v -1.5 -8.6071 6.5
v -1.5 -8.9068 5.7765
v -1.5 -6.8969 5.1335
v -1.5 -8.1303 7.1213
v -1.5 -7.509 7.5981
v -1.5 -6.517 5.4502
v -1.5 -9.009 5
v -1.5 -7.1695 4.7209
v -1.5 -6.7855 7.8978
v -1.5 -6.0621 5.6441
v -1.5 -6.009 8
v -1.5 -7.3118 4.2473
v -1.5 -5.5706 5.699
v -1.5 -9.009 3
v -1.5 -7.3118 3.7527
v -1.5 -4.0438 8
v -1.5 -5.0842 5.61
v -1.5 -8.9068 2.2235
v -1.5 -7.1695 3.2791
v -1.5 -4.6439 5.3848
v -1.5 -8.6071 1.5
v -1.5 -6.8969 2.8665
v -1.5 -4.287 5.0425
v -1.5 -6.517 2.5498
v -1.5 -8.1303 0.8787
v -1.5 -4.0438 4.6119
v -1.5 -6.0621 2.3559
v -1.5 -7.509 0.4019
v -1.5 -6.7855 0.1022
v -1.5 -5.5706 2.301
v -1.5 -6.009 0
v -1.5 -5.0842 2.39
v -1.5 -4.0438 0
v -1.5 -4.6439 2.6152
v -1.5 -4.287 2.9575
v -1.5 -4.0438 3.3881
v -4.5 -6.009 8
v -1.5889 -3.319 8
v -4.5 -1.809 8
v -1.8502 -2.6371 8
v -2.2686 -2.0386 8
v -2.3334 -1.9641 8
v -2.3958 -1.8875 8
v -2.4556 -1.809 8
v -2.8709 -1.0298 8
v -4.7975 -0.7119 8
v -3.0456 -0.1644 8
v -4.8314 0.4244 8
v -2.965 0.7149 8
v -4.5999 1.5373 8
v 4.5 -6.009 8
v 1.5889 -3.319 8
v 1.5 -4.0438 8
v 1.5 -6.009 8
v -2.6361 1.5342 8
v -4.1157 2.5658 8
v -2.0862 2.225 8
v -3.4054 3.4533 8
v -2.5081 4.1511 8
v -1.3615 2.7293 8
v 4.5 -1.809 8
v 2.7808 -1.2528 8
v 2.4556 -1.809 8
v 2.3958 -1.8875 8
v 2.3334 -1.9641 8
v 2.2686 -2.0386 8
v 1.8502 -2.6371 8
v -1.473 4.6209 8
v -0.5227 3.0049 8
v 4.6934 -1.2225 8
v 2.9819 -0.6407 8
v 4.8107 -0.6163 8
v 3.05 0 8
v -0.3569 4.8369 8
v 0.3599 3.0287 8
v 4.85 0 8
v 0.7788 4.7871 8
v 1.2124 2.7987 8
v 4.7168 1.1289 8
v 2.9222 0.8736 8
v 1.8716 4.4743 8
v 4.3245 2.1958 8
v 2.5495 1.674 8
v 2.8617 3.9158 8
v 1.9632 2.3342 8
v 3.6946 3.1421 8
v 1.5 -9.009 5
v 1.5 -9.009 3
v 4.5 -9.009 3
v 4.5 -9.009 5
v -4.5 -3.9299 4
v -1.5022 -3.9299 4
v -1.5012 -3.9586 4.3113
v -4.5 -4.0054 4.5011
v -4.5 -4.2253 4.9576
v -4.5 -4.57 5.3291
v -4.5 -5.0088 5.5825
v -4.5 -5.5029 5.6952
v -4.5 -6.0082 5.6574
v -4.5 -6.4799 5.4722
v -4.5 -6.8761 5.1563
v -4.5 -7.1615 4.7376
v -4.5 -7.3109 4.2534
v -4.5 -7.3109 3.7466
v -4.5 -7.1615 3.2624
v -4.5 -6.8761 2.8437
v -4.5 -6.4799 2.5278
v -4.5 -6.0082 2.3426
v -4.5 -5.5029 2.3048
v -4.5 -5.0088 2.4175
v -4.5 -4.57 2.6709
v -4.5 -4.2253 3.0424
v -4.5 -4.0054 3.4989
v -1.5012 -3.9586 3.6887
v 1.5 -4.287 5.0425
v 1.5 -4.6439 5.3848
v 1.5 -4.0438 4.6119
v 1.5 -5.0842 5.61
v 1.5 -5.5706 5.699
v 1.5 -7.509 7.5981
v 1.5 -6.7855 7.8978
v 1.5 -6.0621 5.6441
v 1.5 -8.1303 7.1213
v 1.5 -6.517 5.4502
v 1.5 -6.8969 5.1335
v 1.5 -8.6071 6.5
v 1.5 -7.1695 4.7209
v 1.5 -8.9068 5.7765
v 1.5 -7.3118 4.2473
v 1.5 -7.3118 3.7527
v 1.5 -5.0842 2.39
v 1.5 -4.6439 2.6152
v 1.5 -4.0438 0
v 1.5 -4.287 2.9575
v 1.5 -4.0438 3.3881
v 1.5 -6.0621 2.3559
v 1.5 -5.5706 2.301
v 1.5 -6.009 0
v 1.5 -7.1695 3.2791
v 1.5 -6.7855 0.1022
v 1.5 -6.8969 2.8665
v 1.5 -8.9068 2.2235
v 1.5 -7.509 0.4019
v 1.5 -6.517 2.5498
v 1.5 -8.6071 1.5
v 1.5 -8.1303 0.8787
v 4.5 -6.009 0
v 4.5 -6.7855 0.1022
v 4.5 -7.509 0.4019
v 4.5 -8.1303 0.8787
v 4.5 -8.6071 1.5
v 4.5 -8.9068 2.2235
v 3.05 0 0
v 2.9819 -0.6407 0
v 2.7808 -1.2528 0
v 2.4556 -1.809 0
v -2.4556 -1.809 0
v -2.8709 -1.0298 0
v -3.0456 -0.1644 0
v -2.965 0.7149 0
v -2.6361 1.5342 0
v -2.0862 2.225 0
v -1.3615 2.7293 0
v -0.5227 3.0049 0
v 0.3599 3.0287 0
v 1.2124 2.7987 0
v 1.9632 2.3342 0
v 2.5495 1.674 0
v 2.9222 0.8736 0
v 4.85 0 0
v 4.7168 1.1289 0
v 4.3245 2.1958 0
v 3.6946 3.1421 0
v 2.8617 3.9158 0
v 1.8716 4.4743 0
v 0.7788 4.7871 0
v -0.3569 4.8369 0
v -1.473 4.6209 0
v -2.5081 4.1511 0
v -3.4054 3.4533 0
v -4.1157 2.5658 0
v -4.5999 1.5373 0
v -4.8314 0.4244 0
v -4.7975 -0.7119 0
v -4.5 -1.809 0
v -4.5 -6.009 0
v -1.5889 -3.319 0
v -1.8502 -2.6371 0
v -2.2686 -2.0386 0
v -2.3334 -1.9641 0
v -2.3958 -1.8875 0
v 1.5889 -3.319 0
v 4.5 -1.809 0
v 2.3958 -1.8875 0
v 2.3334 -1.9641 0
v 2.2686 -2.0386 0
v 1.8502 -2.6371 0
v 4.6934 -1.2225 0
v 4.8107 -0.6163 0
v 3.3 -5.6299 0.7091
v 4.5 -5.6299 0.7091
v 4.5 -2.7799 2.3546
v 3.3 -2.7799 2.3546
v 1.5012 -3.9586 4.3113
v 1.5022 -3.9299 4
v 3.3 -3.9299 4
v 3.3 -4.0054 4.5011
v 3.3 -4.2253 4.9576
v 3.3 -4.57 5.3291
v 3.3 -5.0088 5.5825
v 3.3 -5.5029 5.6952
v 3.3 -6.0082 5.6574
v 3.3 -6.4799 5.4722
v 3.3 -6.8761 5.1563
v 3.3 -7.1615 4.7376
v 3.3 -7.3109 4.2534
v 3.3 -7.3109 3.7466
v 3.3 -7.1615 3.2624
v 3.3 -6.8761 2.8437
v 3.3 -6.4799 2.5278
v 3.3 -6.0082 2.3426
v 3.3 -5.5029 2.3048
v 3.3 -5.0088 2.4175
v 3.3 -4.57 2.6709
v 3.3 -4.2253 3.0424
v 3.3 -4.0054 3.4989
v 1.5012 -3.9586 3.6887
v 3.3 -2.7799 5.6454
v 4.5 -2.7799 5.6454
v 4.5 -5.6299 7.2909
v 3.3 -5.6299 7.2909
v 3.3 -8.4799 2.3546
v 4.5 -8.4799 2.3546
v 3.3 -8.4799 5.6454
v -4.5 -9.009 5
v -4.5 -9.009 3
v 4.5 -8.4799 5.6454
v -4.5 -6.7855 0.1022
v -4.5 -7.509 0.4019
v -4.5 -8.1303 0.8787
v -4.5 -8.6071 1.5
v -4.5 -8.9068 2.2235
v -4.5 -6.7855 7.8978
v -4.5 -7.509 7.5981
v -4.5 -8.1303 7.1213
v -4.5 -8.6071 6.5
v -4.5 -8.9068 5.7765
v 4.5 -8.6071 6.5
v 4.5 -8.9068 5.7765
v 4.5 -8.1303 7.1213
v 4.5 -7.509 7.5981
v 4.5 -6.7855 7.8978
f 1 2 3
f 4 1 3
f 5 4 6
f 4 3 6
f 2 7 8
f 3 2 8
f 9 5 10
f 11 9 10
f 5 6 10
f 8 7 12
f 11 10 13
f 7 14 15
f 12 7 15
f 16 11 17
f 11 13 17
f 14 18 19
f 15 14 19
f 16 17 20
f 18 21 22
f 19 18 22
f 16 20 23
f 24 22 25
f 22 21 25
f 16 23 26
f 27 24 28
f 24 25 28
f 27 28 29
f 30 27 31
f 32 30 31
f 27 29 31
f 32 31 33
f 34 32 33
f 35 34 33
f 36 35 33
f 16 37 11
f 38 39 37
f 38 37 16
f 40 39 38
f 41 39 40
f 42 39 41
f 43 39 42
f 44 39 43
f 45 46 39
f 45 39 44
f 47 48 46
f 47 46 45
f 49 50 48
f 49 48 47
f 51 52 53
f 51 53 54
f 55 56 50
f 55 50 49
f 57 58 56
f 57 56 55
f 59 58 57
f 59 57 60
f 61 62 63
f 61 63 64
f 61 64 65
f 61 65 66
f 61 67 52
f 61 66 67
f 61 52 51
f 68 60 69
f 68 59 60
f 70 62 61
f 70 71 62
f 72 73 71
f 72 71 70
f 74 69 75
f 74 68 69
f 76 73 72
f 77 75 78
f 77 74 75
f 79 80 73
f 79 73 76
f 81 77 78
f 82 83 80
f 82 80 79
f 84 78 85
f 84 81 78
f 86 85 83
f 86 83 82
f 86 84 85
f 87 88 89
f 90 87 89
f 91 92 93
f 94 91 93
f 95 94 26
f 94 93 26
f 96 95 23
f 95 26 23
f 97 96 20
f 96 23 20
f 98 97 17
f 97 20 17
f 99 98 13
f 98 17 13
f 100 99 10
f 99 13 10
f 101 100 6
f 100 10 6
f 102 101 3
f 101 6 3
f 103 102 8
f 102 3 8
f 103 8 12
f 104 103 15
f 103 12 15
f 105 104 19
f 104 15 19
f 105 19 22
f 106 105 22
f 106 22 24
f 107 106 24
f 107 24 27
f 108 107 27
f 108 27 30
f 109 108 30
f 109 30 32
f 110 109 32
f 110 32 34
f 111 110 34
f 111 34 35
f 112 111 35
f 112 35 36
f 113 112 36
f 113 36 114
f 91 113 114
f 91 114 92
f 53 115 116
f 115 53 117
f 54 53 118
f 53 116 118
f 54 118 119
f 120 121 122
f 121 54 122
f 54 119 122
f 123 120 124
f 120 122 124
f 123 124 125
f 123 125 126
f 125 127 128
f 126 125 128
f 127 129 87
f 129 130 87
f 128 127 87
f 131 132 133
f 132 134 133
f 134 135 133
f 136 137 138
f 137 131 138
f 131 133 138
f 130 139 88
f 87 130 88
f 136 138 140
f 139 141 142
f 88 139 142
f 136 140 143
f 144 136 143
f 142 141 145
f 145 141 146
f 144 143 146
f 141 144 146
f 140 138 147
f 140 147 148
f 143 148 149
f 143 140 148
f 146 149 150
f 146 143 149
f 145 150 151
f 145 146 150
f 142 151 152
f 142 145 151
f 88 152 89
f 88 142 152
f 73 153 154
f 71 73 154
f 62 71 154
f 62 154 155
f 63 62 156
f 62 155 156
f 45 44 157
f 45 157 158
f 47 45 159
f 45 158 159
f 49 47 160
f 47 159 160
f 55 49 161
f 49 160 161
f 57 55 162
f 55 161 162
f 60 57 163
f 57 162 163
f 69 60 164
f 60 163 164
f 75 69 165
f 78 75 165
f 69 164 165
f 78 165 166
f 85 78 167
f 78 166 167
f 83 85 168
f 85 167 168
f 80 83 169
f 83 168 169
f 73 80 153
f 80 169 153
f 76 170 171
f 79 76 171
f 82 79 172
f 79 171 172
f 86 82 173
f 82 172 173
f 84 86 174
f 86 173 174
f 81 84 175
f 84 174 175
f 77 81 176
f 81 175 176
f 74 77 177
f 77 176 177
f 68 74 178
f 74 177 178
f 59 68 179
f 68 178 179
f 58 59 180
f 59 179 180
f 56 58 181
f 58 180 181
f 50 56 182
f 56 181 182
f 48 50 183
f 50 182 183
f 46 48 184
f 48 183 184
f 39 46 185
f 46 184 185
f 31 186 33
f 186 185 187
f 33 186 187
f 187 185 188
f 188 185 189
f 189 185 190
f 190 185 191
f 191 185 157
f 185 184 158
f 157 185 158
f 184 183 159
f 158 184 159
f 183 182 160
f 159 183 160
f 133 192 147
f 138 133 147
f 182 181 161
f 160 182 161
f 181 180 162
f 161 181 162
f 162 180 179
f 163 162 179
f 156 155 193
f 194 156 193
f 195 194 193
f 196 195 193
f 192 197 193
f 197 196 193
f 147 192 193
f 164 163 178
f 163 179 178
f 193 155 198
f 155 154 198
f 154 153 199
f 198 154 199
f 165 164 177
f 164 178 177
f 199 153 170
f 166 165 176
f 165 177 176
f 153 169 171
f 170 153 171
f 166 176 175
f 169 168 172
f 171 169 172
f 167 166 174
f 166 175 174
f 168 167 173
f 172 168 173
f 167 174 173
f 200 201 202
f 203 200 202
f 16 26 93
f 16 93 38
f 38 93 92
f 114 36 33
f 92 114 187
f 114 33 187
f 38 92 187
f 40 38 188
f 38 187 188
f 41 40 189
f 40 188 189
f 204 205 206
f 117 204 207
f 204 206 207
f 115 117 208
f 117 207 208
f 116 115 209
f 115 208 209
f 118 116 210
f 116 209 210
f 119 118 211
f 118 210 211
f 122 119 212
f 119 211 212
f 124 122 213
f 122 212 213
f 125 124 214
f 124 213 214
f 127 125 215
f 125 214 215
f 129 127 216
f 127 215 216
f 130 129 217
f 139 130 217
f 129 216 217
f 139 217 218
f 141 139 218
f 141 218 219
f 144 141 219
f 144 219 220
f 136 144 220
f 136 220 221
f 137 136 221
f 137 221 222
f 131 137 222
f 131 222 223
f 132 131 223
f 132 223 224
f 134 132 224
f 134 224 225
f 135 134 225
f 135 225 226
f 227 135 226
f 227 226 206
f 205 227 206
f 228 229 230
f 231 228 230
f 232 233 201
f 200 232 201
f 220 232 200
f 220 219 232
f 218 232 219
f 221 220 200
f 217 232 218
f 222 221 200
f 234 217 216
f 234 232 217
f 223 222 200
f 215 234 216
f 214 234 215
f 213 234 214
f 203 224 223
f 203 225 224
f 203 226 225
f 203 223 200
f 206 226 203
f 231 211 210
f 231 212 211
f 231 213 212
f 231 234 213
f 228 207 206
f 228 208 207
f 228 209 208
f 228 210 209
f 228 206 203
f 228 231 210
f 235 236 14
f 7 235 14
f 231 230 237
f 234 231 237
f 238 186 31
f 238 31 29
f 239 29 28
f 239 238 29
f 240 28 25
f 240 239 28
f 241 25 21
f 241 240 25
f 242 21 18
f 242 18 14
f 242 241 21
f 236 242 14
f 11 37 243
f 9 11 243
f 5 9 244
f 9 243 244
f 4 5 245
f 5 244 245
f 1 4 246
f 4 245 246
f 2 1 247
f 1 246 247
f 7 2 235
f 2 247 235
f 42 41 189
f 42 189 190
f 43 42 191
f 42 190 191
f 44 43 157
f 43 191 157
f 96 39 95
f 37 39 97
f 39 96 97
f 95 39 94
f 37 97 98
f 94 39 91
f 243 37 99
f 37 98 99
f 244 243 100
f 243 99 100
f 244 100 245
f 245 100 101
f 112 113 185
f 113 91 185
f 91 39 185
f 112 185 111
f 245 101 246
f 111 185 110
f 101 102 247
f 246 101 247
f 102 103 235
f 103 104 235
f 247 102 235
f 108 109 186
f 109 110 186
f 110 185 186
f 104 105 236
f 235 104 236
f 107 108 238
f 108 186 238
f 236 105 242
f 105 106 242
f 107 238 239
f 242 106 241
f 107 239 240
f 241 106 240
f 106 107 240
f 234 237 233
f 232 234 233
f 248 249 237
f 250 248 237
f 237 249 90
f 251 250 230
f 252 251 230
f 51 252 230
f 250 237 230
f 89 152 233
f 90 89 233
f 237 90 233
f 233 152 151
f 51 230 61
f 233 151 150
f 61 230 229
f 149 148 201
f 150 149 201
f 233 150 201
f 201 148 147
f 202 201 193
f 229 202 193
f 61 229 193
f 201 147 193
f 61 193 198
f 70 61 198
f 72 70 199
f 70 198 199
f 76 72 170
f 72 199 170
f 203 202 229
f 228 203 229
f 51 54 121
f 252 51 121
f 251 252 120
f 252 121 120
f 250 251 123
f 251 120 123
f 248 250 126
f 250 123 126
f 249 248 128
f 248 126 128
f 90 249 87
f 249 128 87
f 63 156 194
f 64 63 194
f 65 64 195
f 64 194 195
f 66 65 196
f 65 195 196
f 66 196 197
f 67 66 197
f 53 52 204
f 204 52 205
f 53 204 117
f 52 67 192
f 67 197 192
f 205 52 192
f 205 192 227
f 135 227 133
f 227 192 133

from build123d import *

# Parameters (mm, degrees)
F1_DEPTH    = 8
F2_R        = 1.7
F3_DEPTH    = 9.351
F2_R_2      = 2.75
F4_DEPTH    = 1.2
F5_T1_DEPTH = 14.9408405207
F5_T3_DEPTH = 18
F5_T5_DEPTH = 18


# Not quite as in the source:
# - a fillet or chamfer that OpenCascade refuses, or shapes differently, is made with other operations: its cross-section is extruded or revolved along the edge and cut away or added


with BuildPart() as f1:
    # F0 (on Top) → F1 (new body)
    with BuildSketch(Plane.XY):
        with BuildLine():
            Line((-1.5, -4.6122120506), (-1.5, -2.655654345))
            ThreePointArc((-1.5, -2.655654345), (-2.022599329, -2.2828911394), (-2.4556058316, -1.8090052515))
            Line((-2.4556058316, -1.8090052515), (-4.5, -1.8090052515))
            ThreePointArc((-4.5, -1.8090052515), (-3.3112674446, -3.5437279679), (-1.5, -4.6122120506))
        make_face()
        with BuildLine():
            ThreePointArc((2.4556058316, -1.8090052515), (2.022599329, -2.2828911394), (1.5, -2.655654345))
            Line((1.5, -2.655654345), (1.5, -4.6122120506))
            ThreePointArc((1.5, -4.6122120506), (3.3112674446, -3.5437279679), (4.5, -1.8090052515))
            Line((4.5, -1.8090052515), (2.4556058316, -1.8090052515))
        make_face()
        with BuildLine():
            ThreePointArc((4.5, -1.8090052515), (3.3112674446, -3.5437279679), (1.5, -4.6122120506))
            Line((1.5, -4.6122120506), (1.5, -9.0090052515))
            Line((1.5, -9.0090052515), (4.5, -9.0090052515))
            Line((4.5, -9.0090052515), (4.5, -1.8090052515))
        make_face()
        with BuildLine():
            Line((-1.5, -9.0090052515), (-1.5, -4.6122120506))
            ThreePointArc((-1.5, -4.6122120506), (-3.3112674446, -3.5437279679), (-4.5, -1.8090052515))
            Line((-4.5, -1.8090052515), (-4.5, -9.0090052515))
            Line((-4.5, -9.0090052515), (-1.5, -9.0090052515))
        make_face()
        with BuildLine():
            Line((-4.5, -1.8090052515), (-2.4556058316, -1.8090052515))
            ThreePointArc((-2.4556058316, -1.8090052515), (-0.9520772589, 2.8975936384), (3.05, 0))
            ThreePointArc((3.05, 0), (2.8975936384, -0.9520772589), (2.4556058316, -1.8090052515))
            Line((2.4556058316, -1.8090052515), (4.5, -1.8090052515))
            ThreePointArc((4.5, -1.8090052515), (4.7616961264, -0.9212762886), (4.85, 0))
            ThreePointArc((4.85, 0), (-0.9212762886, 4.7616961264), (-4.5, -1.8090052515))
        make_face()
    extrude(amount=F1_DEPTH)

    # F2 (on face) → F3 (cut, through all)
    with BuildSketch(Plane.YZ.offset(4.5)):
        with Locations((-5.6298957206, 4)):
            Circle(F2_R)
    extrude(amount=-F3_DEPTH, mode=Mode.SUBTRACT)

    # F2 (on face) → F4 (cut)
    with BuildSketch(Plane.YZ.offset(4.5)):
        Polygon((-8.4798957206, 5.6454482672), (-8.4798957206, 2.3545517328), (-5.6298957206, 0.7091034656), (-2.7798957206, 2.3545517328), (-2.7798957206, 5.6454482672), (-5.6298957206, 7.2908965344), align=None)
        with Locations((-5.6298957206, 4)):
            Circle(F2_R_2, mode=Mode.SUBTRACT)
        with Locations((-5.6298957206, 4)):
            Circle(F2_R_2)
        with Locations((-5.6298957206, 4)):
            Circle(F2_R, mode=Mode.SUBTRACT)
    extrude(amount=-F4_DEPTH, mode=Mode.SUBTRACT)

    # F5: fillet of radius 3 on 6 edges, made by hand

    # F5_s2 → F5_t1 (cut)
    with BuildSketch(Plane.XY.offset(-3.4704202604)):
        with BuildLine():
            ThreePointArc((2.2685950413, -2.0386212347), (1.6987311022, -2.9700941027), (1.5, -4.0438224491))
            Line((1.5, -4.0438224491), (1.5, -2.655654345))
            ThreePointArc((1.5, -2.655654345), (1.9093872345, -2.3783902936), (2.2685950413, -2.0386212347))
        make_face()
        with BuildLine():
            ThreePointArc((-1.5, -4.0438224491), (-1.6987311022, -2.9700941027), (-2.2685950413, -2.0386212347))
            ThreePointArc((-2.2685950413, -2.0386212347), (-1.9093872345, -2.3783902936), (-1.5, -2.655654345))
            Line((-1.5, -2.655654345), (-1.5, -4.0438224491))
        make_face()
    extrude(amount=F5_T1_DEPTH, mode=Mode.SUBTRACT)

    # F5_s4 → F5_t3 (cut)
    with BuildSketch(Plane.YZ.offset(-6)):
        with BuildLine():
            ThreePointArc((-6.0090052515, 8), (-8.1303255951, 7.1213203436), (-9.0090052515, 5))
            Line((-9.0090052515, 5), (-9.0090052515, 8))
            Line((-9.0090052515, 8), (-6.0090052515, 8))
        make_face()
        with BuildLine():
            ThreePointArc((-6.0090052515, 0), (-8.1303255951, 0.8786796564), (-9.0090052515, 3))
            Line((-9.0090052515, 3), (-9.0090052515, 0))
            Line((-9.0090052515, 0), (-6.0090052515, 0))
        make_face()
    extrude(amount=F5_T3_DEPTH, mode=Mode.SUBTRACT)

    # F5_s6 → F5_t5 (cut)
    with BuildSketch(Plane.YZ.offset(-12)):
        with BuildLine():
            ThreePointArc((-6.0090052515, 8), (-8.1303255951, 7.1213203436), (-9.0090052515, 5))
            Line((-9.0090052515, 5), (-9.0090052515, 8))
            Line((-9.0090052515, 8), (-6.0090052515, 8))
        make_face()
        with BuildLine():
            ThreePointArc((-6.0090052515, 0), (-8.1303255951, 0.8786796564), (-9.0090052515, 3))
            Line((-9.0090052515, 3), (-9.0090052515, 0))
            Line((-9.0090052515, 0), (-6.0090052515, 0))
        make_face()
    extrude(amount=F5_T5_DEPTH, mode=Mode.SUBTRACT)


solid = f1.part
